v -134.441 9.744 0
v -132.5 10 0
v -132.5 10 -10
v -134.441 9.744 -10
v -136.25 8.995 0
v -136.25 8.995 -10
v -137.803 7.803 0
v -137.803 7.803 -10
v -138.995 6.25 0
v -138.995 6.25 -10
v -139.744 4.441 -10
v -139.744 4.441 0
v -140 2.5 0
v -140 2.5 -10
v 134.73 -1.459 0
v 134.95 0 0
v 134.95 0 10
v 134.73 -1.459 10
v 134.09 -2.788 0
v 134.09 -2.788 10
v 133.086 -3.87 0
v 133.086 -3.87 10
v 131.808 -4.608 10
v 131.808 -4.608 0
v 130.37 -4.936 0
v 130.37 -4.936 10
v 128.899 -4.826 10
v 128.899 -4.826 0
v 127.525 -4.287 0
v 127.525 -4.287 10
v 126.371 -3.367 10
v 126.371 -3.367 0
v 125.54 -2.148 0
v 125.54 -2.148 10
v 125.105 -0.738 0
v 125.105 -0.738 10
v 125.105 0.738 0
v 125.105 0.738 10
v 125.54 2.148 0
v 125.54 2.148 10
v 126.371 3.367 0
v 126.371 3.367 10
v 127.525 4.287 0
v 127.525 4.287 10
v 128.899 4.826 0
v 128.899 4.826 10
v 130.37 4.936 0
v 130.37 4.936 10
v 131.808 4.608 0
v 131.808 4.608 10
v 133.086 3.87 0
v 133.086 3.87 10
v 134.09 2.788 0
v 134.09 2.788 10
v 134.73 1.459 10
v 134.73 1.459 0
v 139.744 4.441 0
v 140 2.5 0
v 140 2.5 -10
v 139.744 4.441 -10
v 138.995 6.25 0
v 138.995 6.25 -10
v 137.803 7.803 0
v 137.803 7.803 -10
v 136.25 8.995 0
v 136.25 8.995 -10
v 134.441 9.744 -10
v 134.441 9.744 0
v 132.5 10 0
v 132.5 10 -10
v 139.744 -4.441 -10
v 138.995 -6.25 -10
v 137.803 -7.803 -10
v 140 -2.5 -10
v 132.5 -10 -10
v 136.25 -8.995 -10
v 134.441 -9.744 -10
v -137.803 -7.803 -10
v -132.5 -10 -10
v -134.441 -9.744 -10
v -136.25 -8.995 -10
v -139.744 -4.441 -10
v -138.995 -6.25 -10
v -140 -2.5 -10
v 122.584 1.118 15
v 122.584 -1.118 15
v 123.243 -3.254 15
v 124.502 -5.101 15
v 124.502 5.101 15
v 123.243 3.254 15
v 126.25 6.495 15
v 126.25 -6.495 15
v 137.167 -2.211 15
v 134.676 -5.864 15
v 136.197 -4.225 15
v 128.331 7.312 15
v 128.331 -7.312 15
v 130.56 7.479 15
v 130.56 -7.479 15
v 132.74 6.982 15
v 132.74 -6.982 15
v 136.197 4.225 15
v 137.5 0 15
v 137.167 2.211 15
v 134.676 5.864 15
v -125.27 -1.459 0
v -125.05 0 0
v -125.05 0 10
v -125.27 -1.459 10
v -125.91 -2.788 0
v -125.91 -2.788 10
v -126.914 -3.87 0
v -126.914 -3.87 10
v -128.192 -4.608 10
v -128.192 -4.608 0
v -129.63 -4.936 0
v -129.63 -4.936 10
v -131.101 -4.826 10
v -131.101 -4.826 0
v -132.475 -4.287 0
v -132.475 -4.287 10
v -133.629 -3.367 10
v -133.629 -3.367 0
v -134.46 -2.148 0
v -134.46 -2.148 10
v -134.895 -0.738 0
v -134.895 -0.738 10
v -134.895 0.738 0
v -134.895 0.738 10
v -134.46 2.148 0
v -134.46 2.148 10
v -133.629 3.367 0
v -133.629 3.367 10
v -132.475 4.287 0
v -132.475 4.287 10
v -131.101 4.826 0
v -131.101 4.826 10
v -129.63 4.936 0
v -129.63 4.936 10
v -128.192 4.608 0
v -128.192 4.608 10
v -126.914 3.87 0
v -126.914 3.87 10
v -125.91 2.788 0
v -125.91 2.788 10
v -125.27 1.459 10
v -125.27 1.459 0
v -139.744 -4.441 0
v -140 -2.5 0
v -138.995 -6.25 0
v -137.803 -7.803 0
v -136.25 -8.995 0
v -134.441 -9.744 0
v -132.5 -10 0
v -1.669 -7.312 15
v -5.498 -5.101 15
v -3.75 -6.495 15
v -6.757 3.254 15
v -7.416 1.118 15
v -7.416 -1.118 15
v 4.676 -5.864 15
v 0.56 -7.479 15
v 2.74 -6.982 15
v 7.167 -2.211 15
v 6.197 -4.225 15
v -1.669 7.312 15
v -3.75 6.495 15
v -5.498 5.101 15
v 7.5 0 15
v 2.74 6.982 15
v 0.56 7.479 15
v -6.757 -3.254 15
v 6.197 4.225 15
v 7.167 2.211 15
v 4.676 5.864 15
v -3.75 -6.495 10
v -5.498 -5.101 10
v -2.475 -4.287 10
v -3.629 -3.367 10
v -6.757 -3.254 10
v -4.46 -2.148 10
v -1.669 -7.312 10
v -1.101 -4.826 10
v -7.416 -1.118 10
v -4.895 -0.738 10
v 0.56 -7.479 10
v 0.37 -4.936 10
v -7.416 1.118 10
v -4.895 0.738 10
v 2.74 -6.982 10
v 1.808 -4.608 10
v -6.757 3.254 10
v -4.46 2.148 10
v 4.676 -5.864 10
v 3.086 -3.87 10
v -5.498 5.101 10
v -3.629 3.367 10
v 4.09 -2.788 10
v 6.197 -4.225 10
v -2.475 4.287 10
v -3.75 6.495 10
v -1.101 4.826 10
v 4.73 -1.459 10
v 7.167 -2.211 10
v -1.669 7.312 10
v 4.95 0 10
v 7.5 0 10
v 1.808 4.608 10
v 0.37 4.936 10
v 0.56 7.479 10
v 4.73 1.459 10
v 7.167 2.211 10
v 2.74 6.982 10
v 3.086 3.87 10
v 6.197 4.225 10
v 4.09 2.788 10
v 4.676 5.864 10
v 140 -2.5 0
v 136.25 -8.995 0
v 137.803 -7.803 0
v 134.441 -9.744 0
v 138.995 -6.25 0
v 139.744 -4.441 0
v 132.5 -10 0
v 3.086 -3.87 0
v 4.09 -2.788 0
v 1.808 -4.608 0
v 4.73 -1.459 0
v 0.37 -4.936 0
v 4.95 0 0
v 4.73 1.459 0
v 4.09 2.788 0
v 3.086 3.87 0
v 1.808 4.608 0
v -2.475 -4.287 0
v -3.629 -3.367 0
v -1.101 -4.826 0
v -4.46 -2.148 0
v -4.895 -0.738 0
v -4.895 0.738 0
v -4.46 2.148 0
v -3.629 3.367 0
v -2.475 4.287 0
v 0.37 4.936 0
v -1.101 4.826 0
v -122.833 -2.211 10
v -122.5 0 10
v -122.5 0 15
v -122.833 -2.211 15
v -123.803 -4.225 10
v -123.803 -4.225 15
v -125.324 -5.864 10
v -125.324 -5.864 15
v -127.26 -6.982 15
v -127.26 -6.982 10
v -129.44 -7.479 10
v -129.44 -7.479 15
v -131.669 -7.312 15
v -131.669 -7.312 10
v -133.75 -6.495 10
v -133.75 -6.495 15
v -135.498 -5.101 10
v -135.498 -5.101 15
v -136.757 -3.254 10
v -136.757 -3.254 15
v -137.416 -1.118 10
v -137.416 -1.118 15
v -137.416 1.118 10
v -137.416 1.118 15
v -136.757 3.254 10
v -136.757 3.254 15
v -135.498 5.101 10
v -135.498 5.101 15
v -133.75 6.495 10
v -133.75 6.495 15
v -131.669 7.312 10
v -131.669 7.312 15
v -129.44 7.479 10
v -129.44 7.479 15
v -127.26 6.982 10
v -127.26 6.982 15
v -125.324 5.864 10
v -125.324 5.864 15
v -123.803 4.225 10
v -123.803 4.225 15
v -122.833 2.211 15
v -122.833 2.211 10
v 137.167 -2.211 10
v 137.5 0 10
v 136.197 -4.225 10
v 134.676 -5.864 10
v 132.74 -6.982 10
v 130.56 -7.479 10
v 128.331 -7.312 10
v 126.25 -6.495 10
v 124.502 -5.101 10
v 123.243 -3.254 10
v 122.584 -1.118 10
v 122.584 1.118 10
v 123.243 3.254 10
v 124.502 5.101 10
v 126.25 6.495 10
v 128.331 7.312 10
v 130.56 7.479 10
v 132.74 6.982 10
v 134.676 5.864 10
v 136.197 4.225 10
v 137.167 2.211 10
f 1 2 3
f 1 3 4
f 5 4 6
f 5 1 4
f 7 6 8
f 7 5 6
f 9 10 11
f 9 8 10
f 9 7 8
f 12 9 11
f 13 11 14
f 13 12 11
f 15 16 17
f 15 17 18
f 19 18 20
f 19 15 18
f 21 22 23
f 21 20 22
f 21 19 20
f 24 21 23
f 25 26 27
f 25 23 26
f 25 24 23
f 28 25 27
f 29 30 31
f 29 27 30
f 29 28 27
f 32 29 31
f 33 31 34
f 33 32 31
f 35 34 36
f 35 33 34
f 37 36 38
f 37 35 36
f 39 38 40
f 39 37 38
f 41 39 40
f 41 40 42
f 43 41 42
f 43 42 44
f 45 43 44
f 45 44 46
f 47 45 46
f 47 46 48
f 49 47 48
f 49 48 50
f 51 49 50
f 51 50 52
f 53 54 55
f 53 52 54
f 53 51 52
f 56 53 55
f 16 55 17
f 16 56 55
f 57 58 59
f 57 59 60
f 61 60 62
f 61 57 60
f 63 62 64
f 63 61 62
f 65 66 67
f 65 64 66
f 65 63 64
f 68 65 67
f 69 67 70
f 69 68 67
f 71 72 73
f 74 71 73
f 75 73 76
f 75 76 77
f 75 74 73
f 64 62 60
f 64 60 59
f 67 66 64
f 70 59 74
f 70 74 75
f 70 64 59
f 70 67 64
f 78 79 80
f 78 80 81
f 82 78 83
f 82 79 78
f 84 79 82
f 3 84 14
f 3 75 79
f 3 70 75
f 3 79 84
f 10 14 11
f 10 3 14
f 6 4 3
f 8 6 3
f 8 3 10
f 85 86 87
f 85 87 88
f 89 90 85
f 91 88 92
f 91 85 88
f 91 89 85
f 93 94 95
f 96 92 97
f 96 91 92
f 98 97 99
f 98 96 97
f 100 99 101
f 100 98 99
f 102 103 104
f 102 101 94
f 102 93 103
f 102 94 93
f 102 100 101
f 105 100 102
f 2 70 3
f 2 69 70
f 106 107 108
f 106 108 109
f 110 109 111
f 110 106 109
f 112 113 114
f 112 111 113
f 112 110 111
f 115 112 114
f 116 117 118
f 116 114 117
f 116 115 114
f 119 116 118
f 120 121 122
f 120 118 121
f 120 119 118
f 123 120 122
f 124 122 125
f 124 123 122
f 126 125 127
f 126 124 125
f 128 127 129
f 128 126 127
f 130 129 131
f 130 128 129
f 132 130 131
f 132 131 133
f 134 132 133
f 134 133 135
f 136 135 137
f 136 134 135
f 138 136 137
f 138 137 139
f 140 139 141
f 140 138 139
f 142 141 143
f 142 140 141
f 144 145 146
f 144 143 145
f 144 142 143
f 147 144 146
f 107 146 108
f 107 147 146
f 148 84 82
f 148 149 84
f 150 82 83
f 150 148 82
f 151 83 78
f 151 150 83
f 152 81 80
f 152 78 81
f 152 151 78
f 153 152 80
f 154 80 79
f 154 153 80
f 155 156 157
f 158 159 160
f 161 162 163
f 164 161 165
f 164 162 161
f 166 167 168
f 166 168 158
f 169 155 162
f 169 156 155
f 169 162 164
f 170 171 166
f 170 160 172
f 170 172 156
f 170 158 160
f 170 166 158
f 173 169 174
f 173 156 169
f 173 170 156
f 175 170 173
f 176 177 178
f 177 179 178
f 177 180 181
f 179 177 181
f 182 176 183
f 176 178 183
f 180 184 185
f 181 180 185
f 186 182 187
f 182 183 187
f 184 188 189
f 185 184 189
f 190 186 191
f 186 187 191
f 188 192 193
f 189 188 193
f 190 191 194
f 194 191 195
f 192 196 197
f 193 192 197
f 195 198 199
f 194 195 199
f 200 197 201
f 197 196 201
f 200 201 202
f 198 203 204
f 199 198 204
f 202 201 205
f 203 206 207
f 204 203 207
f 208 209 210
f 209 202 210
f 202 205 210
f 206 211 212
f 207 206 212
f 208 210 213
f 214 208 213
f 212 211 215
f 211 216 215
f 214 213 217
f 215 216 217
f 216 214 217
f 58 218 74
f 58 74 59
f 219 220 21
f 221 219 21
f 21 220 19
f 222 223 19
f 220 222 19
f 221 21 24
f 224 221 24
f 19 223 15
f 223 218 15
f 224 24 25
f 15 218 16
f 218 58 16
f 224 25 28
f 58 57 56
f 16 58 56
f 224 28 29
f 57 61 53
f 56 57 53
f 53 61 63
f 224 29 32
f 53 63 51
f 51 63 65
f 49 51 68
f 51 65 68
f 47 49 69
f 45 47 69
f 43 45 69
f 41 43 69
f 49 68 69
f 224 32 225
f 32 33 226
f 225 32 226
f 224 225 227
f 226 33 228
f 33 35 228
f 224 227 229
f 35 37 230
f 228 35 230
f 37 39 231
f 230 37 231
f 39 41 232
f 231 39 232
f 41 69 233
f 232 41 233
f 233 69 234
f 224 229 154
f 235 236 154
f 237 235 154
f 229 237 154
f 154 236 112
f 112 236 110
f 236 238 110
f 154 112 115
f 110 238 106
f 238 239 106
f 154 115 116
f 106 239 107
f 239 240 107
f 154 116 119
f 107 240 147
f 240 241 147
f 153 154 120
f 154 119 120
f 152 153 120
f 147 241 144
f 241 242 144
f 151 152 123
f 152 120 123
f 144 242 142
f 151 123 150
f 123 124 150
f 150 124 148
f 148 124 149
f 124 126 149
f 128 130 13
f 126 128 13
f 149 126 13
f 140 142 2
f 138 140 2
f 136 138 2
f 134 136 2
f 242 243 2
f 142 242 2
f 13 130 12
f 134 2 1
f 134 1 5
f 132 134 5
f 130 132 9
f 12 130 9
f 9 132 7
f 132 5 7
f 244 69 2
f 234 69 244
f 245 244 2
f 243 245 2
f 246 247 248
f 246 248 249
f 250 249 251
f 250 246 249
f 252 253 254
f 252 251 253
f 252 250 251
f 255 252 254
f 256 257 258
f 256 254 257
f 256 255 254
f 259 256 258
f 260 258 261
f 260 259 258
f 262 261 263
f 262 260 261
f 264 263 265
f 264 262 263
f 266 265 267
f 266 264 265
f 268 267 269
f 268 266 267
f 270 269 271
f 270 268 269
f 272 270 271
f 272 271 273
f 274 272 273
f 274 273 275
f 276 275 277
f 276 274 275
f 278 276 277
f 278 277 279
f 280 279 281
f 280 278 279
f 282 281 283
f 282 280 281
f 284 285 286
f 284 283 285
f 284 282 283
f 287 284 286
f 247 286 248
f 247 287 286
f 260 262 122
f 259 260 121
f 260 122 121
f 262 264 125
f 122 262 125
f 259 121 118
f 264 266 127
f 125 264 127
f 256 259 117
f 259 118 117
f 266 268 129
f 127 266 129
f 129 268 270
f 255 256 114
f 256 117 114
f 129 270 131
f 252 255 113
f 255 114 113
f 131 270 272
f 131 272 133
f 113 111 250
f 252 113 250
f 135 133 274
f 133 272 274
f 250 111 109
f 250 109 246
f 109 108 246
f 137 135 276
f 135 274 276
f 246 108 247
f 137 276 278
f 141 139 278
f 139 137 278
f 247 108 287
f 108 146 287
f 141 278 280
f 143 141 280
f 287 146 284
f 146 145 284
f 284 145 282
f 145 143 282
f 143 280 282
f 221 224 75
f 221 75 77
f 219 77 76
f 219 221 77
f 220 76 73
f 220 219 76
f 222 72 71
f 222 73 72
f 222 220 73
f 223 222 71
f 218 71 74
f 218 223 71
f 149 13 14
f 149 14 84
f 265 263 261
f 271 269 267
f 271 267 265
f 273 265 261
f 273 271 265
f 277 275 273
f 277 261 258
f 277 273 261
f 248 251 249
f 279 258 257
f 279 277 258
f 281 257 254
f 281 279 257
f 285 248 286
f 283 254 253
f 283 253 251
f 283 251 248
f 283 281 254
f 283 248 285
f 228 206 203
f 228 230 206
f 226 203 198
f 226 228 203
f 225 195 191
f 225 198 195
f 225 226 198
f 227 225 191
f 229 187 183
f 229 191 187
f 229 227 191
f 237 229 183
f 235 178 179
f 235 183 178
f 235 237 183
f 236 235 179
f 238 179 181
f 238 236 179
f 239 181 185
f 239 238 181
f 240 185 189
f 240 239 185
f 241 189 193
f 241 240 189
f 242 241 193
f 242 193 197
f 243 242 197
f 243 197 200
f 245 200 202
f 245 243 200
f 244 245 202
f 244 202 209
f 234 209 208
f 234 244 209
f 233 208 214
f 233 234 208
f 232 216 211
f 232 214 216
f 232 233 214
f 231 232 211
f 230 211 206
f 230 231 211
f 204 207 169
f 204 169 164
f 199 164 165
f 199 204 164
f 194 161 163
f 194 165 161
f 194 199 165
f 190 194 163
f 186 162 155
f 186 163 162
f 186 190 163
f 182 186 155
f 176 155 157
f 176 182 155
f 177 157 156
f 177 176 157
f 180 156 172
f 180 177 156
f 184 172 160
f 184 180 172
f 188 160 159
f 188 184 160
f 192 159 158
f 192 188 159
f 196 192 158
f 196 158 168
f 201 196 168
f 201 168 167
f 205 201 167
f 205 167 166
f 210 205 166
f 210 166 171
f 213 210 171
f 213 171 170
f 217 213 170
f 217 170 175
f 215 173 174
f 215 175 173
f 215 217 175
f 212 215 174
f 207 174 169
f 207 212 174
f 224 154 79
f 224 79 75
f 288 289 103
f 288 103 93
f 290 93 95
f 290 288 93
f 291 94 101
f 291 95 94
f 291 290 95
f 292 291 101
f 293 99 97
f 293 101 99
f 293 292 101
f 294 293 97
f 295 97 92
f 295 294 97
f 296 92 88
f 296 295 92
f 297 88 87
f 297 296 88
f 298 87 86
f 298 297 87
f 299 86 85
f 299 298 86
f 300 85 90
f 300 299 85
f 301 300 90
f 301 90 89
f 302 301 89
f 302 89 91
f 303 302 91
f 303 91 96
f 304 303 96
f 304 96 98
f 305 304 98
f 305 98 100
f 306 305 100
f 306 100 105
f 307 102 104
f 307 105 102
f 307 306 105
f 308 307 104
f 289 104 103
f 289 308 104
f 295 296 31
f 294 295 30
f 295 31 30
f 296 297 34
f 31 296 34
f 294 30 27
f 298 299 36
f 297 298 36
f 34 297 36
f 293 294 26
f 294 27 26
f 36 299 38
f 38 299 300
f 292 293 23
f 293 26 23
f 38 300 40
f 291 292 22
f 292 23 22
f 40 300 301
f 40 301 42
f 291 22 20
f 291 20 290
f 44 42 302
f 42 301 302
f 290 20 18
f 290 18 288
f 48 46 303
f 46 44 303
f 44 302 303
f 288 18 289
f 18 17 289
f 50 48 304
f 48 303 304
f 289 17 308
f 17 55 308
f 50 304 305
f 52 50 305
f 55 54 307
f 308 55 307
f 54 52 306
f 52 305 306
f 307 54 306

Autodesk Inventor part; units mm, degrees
ref_plane "YZ Plane" through (0, 0, 0) normal (1, 0, 0) x (0, 1, 0)
ref_plane "XZ Plane" through (0, 0, 0) normal (0, 1, 0) x (-1, 0, 0)
ref_plane "XY Plane" through (0, 0, 0) normal (0, 0, 1) x (1, 0, 0)
sketch "Skizze1" plane through (0, 0, 0) normal (0, 0, 1) x (1, 0, 0)
  circle A0 centre (0, 0) radius 4.95
  circle A1 centre (-130, 0) radius 4.95
  circle A2 centre (130, 0) radius 4.95
  dimension "d0" = 9.9
  dimension "d1" = 9.9
  dimension "d2" = 130
  dimension "d3" = 9.9
  dimension "d4" = 130
extrude "Extrusion1" add sketch "Skizze1" along normal blind 10
sketch "Skizze2" plane through (0, 0, 0) normal (0, 0, -1) x (-1, 0, 0)
  line L0 (132.5, -10) -> (-132.5, -10)
  line L1 (-140, -2.5) -> (-140, 2.5)
  line L2 (-132.5, 10) -> (132.5, 10)
  line L3 (140, 2.5) -> (140, -2.5)
  arc A0 (132.5, -10) -> (140, -2.5) centre (132.5, -2.5) ccw
  arc A1 (140, 2.5) -> (132.5, 10) centre (132.5, 2.5) ccw
  arc A2 (-132.5, 10) -> (-140, 2.5) centre (-132.5, 2.5) ccw
  arc A3 (-140, -2.5) -> (-132.5, -10) centre (-132.5, -2.5) ccw
  point P0 (0, 0)
  point P1 (140, -10)
  point P2 (-140, -10)
  point P3 (140, 10)
  dimension "d7" = 20
  dimension "d8" = 280
  dimension "d9" = 140
  dimension "d10" = 7.5
  dimension "d11" = 10
extrude "Extrusion2" add sketch "Skizze2" along normal blind 10
sketch "Skizze3" plane through (0, 0, 10) normal (0, 0, 1) x (1, 0, 0)
  circle A0 centre (0, 0) radius 7.5
  circle A1 centre (130, 0) radius 7.5
  circle A2 centre (-130, 0) radius 4.95 projected
  circle A3 centre (-130, 0) radius 7.5
  dimension "d14" = 15
  dimension "d15" = 15
  dimension "d16" = 130
  dimension "d17" = 0
  dimension "d18" = 15
extrude "Extrusion3" add sketch "Skizze3" along normal blind 5 contours A0 | A1 | A2 | A3
properties part number "Lenkung_hinten_verbindung"
